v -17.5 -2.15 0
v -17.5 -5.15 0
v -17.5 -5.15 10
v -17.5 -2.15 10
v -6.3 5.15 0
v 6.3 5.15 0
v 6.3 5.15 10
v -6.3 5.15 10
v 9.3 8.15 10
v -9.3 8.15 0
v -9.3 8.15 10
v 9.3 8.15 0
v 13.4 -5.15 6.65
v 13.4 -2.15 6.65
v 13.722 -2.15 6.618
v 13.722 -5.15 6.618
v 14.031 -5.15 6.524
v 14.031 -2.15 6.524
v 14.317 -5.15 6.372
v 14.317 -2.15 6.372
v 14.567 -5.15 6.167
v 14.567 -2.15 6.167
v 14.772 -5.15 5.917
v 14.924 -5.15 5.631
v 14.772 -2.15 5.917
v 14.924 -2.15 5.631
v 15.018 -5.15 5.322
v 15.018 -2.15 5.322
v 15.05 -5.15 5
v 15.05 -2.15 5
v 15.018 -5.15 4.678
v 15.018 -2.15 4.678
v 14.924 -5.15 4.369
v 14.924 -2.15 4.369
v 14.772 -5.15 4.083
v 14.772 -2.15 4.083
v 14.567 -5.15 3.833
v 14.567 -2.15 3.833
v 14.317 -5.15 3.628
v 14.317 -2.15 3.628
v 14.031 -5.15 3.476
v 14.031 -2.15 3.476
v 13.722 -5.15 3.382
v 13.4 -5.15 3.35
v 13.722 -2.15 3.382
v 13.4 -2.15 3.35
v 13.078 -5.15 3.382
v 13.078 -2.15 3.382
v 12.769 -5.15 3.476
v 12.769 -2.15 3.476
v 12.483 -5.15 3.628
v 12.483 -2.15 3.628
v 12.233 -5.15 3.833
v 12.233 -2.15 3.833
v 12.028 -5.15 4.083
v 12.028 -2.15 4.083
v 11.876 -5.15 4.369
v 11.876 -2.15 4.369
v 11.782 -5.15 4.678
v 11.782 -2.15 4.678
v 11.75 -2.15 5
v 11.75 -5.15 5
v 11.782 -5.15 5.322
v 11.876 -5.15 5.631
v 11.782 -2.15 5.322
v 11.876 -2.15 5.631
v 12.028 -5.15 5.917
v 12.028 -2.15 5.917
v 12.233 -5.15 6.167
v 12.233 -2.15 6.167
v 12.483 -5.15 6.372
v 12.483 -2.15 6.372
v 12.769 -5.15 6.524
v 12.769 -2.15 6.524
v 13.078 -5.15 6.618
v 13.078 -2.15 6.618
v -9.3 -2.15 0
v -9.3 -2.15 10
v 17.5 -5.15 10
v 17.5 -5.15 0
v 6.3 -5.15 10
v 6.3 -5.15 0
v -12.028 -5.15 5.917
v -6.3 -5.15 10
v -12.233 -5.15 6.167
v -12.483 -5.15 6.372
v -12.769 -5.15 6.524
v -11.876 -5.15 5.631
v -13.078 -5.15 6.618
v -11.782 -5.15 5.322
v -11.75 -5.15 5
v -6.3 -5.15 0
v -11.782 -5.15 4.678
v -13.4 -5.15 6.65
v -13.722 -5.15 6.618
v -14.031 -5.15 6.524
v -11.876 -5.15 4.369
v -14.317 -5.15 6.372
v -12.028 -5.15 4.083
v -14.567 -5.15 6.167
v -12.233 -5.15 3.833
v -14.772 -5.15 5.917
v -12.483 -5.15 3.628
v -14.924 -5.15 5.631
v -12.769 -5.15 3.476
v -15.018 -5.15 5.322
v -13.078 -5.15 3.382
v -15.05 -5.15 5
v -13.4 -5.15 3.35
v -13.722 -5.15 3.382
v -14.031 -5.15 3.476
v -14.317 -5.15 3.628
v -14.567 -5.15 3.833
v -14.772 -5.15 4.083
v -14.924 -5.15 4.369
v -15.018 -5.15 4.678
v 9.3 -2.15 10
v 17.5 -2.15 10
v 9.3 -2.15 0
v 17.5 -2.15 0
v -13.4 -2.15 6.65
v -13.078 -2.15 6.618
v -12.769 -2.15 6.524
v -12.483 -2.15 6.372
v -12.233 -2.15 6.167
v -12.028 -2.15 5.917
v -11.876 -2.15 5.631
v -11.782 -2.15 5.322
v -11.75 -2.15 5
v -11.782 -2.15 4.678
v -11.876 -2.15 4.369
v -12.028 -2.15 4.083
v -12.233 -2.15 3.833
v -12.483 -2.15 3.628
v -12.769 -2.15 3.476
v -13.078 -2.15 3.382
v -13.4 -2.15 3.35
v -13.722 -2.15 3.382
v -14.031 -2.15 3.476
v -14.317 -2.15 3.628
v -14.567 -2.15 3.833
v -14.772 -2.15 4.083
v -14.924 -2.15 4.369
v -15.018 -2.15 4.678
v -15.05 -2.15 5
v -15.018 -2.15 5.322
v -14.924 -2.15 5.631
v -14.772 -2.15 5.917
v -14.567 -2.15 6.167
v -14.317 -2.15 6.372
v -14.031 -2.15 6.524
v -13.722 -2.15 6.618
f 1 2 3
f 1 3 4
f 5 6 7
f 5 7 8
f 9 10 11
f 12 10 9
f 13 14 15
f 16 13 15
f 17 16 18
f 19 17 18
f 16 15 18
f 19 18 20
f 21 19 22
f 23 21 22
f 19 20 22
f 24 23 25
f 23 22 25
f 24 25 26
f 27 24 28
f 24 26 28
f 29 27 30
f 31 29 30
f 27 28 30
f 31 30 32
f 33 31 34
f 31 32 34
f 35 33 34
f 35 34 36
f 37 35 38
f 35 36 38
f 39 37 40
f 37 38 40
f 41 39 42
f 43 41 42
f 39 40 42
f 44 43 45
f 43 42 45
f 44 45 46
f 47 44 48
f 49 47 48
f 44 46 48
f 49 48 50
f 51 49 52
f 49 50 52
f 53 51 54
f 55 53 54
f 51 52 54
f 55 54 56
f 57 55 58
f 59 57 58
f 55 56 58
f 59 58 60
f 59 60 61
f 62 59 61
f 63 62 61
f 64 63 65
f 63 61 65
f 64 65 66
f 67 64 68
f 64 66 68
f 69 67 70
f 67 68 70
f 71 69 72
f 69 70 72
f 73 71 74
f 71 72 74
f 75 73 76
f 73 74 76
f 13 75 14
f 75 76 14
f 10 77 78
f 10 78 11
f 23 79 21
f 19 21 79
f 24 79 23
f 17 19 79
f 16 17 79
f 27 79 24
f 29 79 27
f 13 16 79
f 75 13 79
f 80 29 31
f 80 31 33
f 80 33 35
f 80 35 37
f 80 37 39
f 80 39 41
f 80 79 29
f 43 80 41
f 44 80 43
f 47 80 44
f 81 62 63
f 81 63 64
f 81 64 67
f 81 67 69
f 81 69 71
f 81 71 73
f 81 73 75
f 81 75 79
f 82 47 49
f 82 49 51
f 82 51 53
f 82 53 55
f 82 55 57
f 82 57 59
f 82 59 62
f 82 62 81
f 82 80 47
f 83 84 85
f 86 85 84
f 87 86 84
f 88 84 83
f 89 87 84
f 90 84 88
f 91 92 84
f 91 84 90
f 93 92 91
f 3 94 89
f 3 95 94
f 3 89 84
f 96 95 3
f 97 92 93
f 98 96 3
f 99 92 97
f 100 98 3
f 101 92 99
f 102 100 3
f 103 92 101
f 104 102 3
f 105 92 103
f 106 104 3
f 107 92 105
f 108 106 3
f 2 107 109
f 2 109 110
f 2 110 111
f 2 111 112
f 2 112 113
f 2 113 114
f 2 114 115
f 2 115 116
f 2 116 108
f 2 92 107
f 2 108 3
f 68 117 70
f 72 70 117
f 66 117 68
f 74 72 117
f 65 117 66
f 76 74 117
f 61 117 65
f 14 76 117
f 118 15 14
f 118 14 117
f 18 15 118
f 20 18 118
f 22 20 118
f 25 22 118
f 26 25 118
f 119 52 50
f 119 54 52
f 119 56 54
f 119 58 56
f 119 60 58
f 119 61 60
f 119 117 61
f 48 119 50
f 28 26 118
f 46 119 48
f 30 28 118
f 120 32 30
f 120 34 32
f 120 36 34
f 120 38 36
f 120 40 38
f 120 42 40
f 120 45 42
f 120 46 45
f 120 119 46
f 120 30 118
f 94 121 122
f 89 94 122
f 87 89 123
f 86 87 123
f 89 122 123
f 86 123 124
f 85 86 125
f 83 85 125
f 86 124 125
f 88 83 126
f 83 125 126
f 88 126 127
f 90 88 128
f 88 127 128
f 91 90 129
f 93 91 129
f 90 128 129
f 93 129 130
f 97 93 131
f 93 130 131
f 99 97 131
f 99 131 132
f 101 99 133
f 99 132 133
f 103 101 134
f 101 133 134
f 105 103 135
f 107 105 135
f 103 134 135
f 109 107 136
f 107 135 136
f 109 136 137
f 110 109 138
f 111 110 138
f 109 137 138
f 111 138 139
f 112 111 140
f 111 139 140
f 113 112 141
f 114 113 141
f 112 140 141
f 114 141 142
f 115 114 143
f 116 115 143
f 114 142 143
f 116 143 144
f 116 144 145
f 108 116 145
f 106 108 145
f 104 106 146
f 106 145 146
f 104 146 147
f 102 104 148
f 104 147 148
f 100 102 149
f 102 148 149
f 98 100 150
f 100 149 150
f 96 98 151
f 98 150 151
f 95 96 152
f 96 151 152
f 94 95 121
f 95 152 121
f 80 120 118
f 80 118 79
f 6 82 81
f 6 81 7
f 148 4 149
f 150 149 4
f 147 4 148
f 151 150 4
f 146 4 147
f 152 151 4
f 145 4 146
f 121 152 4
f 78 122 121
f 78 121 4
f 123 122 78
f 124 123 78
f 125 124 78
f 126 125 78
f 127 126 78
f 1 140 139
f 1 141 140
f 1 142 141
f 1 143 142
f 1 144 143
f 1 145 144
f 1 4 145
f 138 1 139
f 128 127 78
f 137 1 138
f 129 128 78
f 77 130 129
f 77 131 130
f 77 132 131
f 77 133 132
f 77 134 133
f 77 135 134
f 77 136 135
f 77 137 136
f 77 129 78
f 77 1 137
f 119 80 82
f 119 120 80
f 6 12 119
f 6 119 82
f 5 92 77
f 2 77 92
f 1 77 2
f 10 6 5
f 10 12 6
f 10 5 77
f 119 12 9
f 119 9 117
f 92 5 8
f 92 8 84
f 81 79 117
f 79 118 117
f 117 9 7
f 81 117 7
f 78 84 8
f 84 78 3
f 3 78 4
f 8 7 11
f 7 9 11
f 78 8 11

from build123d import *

# Parameters (mm, degrees)
BOSS_EXTRUDE1_DEPTH = 10
SKETCH2_R           = 1.65
CUT_EXTRUDE1_DEPTH  = 3


with BuildPart() as part:
    # Sketch1 → Boss-Extrude1 (new body)
    with BuildSketch(Plane.XY):
        Polygon((17.5, -5.15), (6.3, -5.15), (6.3, 5.15), (-6.3, 5.15), (-6.3, -5.15), (-17.5, -5.15), (-17.5, -2.15), (-9.3, -2.15), (-9.3, 8.15), (9.3, 8.15), (9.3, -2.15), (17.5, -2.15), align=None)
    extrude(amount=BOSS_EXTRUDE1_DEPTH)

    # Sketch2 → Cut-Extrude1 (cut)
    with BuildSketch(Plane(origin=(0, -2.15, 0), x_dir=(1, 0, 0), z_dir=(0, 1, 0))):
        with Locations(Location((13.4, -5, 0), (0, 0, 270))):
            Circle(SKETCH2_R)
        with Locations(Location((-13.4, -5, 0), (0, 0, 270))):
            Circle(SKETCH2_R)
    extrude(amount=-CUT_EXTRUDE1_DEPTH, mode=Mode.SUBTRACT)


solid = part.part
